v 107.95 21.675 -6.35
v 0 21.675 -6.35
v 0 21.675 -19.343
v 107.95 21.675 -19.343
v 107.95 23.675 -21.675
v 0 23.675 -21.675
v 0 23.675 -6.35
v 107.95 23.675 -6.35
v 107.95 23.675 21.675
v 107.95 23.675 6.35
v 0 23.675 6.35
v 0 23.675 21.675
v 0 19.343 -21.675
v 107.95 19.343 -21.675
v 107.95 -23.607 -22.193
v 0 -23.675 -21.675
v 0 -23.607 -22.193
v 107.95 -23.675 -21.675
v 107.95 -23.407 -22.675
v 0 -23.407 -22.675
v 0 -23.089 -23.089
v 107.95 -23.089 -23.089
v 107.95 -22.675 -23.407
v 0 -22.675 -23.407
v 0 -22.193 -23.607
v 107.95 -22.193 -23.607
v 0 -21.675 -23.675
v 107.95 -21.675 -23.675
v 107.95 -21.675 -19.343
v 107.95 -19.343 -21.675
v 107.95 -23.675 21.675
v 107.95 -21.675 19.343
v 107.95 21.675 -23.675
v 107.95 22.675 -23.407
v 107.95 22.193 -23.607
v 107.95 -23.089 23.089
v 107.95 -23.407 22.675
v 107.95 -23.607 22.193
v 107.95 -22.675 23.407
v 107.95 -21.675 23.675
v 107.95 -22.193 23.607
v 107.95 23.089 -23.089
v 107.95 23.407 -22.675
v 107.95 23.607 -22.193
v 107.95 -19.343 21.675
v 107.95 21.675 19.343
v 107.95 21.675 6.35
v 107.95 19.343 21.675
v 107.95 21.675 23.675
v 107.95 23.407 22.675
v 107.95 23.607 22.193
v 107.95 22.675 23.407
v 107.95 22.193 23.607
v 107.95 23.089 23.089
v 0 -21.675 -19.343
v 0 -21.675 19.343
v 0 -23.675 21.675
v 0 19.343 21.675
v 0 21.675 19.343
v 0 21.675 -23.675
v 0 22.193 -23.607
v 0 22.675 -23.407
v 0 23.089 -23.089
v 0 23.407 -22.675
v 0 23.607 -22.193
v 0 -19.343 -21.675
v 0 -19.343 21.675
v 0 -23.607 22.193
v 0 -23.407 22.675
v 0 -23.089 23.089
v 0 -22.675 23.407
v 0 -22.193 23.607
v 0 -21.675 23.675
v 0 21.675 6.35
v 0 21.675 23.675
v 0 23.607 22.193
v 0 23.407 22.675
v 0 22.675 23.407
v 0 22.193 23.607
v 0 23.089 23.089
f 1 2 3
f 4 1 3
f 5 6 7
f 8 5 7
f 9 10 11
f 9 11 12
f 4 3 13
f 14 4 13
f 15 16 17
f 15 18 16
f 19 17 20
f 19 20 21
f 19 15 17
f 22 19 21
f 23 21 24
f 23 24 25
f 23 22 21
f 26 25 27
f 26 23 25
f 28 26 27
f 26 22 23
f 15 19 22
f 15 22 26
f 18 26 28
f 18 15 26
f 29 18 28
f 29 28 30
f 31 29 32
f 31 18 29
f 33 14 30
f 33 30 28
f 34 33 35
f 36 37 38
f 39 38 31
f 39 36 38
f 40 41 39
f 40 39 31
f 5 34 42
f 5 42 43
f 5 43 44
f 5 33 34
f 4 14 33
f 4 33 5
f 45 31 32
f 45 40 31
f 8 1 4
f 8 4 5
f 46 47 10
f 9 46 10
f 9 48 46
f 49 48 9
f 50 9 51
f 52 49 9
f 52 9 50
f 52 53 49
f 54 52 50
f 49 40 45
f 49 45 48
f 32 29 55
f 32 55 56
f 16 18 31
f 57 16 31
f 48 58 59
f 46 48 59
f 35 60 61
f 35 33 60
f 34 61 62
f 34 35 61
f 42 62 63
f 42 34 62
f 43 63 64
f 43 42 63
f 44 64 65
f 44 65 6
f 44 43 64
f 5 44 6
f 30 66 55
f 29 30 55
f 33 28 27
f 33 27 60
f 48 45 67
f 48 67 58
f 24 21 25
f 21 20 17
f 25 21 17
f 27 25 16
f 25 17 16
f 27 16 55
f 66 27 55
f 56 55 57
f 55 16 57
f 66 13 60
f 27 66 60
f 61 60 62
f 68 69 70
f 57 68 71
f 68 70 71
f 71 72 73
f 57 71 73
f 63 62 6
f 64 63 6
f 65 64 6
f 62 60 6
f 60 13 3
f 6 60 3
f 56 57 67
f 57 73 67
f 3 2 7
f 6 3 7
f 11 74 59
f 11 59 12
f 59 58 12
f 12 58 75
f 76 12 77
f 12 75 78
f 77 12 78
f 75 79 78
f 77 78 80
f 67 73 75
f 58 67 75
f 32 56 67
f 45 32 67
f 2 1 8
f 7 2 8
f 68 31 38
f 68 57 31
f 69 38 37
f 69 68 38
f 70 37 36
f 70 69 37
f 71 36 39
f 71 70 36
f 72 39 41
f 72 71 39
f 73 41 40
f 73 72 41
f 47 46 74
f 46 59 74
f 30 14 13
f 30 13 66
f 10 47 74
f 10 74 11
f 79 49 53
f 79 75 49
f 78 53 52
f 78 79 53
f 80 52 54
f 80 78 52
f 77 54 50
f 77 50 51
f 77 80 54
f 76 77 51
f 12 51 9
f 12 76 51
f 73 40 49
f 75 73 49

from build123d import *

# Parameters (mm, degrees)
F1_W      = 47.35
F1_H      = 47.35
F2_DEPTH  = 2
F3_DEPTH  = 107.95
F4_R      = 6.35
F7_DEPTH  = 107.951
F8_R      = 6.35
F9_DEPTH  = 25
F10_R     = 2
F11_W     = 2
F11_H     = 12.7
F12_DEPTH = 107.951
F13_DEPTH = 25


# Not quite as in the source:
# - a feature names something its author has since deleted; it is built from what else it names


with BuildPart() as f2:
    # F1 (on Right) → F2 (new body)
    with BuildSketch(Plane.YZ):
        Rectangle(F1_W, F1_H)
        Polygon((19.3428993274, 21.675), (21.675, 21.675), (21.675, 19.3428993274), (21.675, -19.3428993274), (21.675, -21.675), (19.3428993274, -21.675), (-19.3428993274, -21.675), (-21.675, -21.675), (-21.675, -19.3428993274), (-21.675, 19.3428993274), (-21.675, 21.675), (-19.3428993274, 21.675), align=None, mode=Mode.SUBTRACT)
        Polygon((21.675, 19.3428993274), (19.3428993274, 21.675), (-19.3428993274, 21.675), (-21.675, 19.3428993274), (-21.675, -19.3428993274), (-19.3428993274, -21.675), (19.3428993274, -21.675), (21.675, -19.3428993274), align=None)
        Polygon((-19.3428993274, -21.675), (-21.675, -19.3428993274), (-21.675, -21.675), align=None)
        Polygon((21.675, -21.675), (21.675, -19.3428993274), (19.3428993274, -21.675), align=None)
        Polygon((21.675, 19.3428993274), (21.675, 21.675), (19.3428993274, 21.675), align=None)
        Polygon((-21.675, 19.3428993274), (-19.3428993274, 21.675), (-21.675, 21.675), align=None)
    extrude(amount=F2_DEPTH)

    # F1 (on Right) → F3 (join)
    with BuildSketch(Plane.YZ):
        Rectangle(F1_W, F1_H)
        Polygon((19.3428993274, 21.675), (21.675, 21.675), (21.675, 19.3428993274), (21.675, -19.3428993274), (21.675, -21.675), (19.3428993274, -21.675), (-19.3428993274, -21.675), (-21.675, -21.675), (-21.675, -19.3428993274), (-21.675, 19.3428993274), (-21.675, 21.675), (-19.3428993274, 21.675), align=None, mode=Mode.SUBTRACT)
        Polygon((21.675, 19.3428993274), (21.675, 21.675), (19.3428993274, 21.675), align=None)
        Polygon((21.675, -21.675), (21.675, -19.3428993274), (19.3428993274, -21.675), align=None)
        Polygon((-19.3428993274, -21.675), (-21.675, -19.3428993274), (-21.675, -21.675), align=None)
        Polygon((-21.675, 19.3428993274), (-19.3428993274, 21.675), (-21.675, 21.675), align=None)
    extrude(amount=F3_DEPTH)

    # F4 (on face) → F7 (cut, through all)
    with BuildSketch(Plane.YZ):
        Circle(F4_R)
    extrude(amount=F7_DEPTH, mode=Mode.SUBTRACT)

    # F8 (on face) → F9 (cut)
    with BuildSketch(Plane(origin=(0, 23.675, 0), x_dir=(-1, 0, 0), z_dir=(0, 1, 0))):
        with Locations((-94.95, 0)):
            Circle(F8_R)
    extrude(amount=-F9_DEPTH, mode=Mode.SUBTRACT)

    # F10
    f10_edges = [f2.edges().sort_by_distance(p)[0] for p in [
        (53.975, -23.675, 23.675),
        (53.975, 23.675, 23.675),
        (53.975, 23.675, -23.675),
        (53.975, -23.675, -23.675),
    ]]
    fillet(f10_edges, radius=F10_R)

    # F11 (on face) → F12 (cut, through all)
    with BuildSketch(Plane.YZ.offset(107.95)):
        with Locations((22.675, 0)):
            Rectangle(F11_W, F11_H)
    extrude(amount=-F12_DEPTH, mode=Mode.SUBTRACT)

    # F1 (on Right) → F13 (cut)
    with BuildSketch(Plane.YZ):
        Polygon((21.675, 19.3428993274), (19.3428993274, 21.675), (-19.3428993274, 21.675), (-21.675, 19.3428993274), (-21.675, -19.3428993274), (-19.3428993274, -21.675), (19.3428993274, -21.675), (21.675, -19.3428993274), align=None)
    extrude(amount=F13_DEPTH, mode=Mode.SUBTRACT)


solid = f2.part
